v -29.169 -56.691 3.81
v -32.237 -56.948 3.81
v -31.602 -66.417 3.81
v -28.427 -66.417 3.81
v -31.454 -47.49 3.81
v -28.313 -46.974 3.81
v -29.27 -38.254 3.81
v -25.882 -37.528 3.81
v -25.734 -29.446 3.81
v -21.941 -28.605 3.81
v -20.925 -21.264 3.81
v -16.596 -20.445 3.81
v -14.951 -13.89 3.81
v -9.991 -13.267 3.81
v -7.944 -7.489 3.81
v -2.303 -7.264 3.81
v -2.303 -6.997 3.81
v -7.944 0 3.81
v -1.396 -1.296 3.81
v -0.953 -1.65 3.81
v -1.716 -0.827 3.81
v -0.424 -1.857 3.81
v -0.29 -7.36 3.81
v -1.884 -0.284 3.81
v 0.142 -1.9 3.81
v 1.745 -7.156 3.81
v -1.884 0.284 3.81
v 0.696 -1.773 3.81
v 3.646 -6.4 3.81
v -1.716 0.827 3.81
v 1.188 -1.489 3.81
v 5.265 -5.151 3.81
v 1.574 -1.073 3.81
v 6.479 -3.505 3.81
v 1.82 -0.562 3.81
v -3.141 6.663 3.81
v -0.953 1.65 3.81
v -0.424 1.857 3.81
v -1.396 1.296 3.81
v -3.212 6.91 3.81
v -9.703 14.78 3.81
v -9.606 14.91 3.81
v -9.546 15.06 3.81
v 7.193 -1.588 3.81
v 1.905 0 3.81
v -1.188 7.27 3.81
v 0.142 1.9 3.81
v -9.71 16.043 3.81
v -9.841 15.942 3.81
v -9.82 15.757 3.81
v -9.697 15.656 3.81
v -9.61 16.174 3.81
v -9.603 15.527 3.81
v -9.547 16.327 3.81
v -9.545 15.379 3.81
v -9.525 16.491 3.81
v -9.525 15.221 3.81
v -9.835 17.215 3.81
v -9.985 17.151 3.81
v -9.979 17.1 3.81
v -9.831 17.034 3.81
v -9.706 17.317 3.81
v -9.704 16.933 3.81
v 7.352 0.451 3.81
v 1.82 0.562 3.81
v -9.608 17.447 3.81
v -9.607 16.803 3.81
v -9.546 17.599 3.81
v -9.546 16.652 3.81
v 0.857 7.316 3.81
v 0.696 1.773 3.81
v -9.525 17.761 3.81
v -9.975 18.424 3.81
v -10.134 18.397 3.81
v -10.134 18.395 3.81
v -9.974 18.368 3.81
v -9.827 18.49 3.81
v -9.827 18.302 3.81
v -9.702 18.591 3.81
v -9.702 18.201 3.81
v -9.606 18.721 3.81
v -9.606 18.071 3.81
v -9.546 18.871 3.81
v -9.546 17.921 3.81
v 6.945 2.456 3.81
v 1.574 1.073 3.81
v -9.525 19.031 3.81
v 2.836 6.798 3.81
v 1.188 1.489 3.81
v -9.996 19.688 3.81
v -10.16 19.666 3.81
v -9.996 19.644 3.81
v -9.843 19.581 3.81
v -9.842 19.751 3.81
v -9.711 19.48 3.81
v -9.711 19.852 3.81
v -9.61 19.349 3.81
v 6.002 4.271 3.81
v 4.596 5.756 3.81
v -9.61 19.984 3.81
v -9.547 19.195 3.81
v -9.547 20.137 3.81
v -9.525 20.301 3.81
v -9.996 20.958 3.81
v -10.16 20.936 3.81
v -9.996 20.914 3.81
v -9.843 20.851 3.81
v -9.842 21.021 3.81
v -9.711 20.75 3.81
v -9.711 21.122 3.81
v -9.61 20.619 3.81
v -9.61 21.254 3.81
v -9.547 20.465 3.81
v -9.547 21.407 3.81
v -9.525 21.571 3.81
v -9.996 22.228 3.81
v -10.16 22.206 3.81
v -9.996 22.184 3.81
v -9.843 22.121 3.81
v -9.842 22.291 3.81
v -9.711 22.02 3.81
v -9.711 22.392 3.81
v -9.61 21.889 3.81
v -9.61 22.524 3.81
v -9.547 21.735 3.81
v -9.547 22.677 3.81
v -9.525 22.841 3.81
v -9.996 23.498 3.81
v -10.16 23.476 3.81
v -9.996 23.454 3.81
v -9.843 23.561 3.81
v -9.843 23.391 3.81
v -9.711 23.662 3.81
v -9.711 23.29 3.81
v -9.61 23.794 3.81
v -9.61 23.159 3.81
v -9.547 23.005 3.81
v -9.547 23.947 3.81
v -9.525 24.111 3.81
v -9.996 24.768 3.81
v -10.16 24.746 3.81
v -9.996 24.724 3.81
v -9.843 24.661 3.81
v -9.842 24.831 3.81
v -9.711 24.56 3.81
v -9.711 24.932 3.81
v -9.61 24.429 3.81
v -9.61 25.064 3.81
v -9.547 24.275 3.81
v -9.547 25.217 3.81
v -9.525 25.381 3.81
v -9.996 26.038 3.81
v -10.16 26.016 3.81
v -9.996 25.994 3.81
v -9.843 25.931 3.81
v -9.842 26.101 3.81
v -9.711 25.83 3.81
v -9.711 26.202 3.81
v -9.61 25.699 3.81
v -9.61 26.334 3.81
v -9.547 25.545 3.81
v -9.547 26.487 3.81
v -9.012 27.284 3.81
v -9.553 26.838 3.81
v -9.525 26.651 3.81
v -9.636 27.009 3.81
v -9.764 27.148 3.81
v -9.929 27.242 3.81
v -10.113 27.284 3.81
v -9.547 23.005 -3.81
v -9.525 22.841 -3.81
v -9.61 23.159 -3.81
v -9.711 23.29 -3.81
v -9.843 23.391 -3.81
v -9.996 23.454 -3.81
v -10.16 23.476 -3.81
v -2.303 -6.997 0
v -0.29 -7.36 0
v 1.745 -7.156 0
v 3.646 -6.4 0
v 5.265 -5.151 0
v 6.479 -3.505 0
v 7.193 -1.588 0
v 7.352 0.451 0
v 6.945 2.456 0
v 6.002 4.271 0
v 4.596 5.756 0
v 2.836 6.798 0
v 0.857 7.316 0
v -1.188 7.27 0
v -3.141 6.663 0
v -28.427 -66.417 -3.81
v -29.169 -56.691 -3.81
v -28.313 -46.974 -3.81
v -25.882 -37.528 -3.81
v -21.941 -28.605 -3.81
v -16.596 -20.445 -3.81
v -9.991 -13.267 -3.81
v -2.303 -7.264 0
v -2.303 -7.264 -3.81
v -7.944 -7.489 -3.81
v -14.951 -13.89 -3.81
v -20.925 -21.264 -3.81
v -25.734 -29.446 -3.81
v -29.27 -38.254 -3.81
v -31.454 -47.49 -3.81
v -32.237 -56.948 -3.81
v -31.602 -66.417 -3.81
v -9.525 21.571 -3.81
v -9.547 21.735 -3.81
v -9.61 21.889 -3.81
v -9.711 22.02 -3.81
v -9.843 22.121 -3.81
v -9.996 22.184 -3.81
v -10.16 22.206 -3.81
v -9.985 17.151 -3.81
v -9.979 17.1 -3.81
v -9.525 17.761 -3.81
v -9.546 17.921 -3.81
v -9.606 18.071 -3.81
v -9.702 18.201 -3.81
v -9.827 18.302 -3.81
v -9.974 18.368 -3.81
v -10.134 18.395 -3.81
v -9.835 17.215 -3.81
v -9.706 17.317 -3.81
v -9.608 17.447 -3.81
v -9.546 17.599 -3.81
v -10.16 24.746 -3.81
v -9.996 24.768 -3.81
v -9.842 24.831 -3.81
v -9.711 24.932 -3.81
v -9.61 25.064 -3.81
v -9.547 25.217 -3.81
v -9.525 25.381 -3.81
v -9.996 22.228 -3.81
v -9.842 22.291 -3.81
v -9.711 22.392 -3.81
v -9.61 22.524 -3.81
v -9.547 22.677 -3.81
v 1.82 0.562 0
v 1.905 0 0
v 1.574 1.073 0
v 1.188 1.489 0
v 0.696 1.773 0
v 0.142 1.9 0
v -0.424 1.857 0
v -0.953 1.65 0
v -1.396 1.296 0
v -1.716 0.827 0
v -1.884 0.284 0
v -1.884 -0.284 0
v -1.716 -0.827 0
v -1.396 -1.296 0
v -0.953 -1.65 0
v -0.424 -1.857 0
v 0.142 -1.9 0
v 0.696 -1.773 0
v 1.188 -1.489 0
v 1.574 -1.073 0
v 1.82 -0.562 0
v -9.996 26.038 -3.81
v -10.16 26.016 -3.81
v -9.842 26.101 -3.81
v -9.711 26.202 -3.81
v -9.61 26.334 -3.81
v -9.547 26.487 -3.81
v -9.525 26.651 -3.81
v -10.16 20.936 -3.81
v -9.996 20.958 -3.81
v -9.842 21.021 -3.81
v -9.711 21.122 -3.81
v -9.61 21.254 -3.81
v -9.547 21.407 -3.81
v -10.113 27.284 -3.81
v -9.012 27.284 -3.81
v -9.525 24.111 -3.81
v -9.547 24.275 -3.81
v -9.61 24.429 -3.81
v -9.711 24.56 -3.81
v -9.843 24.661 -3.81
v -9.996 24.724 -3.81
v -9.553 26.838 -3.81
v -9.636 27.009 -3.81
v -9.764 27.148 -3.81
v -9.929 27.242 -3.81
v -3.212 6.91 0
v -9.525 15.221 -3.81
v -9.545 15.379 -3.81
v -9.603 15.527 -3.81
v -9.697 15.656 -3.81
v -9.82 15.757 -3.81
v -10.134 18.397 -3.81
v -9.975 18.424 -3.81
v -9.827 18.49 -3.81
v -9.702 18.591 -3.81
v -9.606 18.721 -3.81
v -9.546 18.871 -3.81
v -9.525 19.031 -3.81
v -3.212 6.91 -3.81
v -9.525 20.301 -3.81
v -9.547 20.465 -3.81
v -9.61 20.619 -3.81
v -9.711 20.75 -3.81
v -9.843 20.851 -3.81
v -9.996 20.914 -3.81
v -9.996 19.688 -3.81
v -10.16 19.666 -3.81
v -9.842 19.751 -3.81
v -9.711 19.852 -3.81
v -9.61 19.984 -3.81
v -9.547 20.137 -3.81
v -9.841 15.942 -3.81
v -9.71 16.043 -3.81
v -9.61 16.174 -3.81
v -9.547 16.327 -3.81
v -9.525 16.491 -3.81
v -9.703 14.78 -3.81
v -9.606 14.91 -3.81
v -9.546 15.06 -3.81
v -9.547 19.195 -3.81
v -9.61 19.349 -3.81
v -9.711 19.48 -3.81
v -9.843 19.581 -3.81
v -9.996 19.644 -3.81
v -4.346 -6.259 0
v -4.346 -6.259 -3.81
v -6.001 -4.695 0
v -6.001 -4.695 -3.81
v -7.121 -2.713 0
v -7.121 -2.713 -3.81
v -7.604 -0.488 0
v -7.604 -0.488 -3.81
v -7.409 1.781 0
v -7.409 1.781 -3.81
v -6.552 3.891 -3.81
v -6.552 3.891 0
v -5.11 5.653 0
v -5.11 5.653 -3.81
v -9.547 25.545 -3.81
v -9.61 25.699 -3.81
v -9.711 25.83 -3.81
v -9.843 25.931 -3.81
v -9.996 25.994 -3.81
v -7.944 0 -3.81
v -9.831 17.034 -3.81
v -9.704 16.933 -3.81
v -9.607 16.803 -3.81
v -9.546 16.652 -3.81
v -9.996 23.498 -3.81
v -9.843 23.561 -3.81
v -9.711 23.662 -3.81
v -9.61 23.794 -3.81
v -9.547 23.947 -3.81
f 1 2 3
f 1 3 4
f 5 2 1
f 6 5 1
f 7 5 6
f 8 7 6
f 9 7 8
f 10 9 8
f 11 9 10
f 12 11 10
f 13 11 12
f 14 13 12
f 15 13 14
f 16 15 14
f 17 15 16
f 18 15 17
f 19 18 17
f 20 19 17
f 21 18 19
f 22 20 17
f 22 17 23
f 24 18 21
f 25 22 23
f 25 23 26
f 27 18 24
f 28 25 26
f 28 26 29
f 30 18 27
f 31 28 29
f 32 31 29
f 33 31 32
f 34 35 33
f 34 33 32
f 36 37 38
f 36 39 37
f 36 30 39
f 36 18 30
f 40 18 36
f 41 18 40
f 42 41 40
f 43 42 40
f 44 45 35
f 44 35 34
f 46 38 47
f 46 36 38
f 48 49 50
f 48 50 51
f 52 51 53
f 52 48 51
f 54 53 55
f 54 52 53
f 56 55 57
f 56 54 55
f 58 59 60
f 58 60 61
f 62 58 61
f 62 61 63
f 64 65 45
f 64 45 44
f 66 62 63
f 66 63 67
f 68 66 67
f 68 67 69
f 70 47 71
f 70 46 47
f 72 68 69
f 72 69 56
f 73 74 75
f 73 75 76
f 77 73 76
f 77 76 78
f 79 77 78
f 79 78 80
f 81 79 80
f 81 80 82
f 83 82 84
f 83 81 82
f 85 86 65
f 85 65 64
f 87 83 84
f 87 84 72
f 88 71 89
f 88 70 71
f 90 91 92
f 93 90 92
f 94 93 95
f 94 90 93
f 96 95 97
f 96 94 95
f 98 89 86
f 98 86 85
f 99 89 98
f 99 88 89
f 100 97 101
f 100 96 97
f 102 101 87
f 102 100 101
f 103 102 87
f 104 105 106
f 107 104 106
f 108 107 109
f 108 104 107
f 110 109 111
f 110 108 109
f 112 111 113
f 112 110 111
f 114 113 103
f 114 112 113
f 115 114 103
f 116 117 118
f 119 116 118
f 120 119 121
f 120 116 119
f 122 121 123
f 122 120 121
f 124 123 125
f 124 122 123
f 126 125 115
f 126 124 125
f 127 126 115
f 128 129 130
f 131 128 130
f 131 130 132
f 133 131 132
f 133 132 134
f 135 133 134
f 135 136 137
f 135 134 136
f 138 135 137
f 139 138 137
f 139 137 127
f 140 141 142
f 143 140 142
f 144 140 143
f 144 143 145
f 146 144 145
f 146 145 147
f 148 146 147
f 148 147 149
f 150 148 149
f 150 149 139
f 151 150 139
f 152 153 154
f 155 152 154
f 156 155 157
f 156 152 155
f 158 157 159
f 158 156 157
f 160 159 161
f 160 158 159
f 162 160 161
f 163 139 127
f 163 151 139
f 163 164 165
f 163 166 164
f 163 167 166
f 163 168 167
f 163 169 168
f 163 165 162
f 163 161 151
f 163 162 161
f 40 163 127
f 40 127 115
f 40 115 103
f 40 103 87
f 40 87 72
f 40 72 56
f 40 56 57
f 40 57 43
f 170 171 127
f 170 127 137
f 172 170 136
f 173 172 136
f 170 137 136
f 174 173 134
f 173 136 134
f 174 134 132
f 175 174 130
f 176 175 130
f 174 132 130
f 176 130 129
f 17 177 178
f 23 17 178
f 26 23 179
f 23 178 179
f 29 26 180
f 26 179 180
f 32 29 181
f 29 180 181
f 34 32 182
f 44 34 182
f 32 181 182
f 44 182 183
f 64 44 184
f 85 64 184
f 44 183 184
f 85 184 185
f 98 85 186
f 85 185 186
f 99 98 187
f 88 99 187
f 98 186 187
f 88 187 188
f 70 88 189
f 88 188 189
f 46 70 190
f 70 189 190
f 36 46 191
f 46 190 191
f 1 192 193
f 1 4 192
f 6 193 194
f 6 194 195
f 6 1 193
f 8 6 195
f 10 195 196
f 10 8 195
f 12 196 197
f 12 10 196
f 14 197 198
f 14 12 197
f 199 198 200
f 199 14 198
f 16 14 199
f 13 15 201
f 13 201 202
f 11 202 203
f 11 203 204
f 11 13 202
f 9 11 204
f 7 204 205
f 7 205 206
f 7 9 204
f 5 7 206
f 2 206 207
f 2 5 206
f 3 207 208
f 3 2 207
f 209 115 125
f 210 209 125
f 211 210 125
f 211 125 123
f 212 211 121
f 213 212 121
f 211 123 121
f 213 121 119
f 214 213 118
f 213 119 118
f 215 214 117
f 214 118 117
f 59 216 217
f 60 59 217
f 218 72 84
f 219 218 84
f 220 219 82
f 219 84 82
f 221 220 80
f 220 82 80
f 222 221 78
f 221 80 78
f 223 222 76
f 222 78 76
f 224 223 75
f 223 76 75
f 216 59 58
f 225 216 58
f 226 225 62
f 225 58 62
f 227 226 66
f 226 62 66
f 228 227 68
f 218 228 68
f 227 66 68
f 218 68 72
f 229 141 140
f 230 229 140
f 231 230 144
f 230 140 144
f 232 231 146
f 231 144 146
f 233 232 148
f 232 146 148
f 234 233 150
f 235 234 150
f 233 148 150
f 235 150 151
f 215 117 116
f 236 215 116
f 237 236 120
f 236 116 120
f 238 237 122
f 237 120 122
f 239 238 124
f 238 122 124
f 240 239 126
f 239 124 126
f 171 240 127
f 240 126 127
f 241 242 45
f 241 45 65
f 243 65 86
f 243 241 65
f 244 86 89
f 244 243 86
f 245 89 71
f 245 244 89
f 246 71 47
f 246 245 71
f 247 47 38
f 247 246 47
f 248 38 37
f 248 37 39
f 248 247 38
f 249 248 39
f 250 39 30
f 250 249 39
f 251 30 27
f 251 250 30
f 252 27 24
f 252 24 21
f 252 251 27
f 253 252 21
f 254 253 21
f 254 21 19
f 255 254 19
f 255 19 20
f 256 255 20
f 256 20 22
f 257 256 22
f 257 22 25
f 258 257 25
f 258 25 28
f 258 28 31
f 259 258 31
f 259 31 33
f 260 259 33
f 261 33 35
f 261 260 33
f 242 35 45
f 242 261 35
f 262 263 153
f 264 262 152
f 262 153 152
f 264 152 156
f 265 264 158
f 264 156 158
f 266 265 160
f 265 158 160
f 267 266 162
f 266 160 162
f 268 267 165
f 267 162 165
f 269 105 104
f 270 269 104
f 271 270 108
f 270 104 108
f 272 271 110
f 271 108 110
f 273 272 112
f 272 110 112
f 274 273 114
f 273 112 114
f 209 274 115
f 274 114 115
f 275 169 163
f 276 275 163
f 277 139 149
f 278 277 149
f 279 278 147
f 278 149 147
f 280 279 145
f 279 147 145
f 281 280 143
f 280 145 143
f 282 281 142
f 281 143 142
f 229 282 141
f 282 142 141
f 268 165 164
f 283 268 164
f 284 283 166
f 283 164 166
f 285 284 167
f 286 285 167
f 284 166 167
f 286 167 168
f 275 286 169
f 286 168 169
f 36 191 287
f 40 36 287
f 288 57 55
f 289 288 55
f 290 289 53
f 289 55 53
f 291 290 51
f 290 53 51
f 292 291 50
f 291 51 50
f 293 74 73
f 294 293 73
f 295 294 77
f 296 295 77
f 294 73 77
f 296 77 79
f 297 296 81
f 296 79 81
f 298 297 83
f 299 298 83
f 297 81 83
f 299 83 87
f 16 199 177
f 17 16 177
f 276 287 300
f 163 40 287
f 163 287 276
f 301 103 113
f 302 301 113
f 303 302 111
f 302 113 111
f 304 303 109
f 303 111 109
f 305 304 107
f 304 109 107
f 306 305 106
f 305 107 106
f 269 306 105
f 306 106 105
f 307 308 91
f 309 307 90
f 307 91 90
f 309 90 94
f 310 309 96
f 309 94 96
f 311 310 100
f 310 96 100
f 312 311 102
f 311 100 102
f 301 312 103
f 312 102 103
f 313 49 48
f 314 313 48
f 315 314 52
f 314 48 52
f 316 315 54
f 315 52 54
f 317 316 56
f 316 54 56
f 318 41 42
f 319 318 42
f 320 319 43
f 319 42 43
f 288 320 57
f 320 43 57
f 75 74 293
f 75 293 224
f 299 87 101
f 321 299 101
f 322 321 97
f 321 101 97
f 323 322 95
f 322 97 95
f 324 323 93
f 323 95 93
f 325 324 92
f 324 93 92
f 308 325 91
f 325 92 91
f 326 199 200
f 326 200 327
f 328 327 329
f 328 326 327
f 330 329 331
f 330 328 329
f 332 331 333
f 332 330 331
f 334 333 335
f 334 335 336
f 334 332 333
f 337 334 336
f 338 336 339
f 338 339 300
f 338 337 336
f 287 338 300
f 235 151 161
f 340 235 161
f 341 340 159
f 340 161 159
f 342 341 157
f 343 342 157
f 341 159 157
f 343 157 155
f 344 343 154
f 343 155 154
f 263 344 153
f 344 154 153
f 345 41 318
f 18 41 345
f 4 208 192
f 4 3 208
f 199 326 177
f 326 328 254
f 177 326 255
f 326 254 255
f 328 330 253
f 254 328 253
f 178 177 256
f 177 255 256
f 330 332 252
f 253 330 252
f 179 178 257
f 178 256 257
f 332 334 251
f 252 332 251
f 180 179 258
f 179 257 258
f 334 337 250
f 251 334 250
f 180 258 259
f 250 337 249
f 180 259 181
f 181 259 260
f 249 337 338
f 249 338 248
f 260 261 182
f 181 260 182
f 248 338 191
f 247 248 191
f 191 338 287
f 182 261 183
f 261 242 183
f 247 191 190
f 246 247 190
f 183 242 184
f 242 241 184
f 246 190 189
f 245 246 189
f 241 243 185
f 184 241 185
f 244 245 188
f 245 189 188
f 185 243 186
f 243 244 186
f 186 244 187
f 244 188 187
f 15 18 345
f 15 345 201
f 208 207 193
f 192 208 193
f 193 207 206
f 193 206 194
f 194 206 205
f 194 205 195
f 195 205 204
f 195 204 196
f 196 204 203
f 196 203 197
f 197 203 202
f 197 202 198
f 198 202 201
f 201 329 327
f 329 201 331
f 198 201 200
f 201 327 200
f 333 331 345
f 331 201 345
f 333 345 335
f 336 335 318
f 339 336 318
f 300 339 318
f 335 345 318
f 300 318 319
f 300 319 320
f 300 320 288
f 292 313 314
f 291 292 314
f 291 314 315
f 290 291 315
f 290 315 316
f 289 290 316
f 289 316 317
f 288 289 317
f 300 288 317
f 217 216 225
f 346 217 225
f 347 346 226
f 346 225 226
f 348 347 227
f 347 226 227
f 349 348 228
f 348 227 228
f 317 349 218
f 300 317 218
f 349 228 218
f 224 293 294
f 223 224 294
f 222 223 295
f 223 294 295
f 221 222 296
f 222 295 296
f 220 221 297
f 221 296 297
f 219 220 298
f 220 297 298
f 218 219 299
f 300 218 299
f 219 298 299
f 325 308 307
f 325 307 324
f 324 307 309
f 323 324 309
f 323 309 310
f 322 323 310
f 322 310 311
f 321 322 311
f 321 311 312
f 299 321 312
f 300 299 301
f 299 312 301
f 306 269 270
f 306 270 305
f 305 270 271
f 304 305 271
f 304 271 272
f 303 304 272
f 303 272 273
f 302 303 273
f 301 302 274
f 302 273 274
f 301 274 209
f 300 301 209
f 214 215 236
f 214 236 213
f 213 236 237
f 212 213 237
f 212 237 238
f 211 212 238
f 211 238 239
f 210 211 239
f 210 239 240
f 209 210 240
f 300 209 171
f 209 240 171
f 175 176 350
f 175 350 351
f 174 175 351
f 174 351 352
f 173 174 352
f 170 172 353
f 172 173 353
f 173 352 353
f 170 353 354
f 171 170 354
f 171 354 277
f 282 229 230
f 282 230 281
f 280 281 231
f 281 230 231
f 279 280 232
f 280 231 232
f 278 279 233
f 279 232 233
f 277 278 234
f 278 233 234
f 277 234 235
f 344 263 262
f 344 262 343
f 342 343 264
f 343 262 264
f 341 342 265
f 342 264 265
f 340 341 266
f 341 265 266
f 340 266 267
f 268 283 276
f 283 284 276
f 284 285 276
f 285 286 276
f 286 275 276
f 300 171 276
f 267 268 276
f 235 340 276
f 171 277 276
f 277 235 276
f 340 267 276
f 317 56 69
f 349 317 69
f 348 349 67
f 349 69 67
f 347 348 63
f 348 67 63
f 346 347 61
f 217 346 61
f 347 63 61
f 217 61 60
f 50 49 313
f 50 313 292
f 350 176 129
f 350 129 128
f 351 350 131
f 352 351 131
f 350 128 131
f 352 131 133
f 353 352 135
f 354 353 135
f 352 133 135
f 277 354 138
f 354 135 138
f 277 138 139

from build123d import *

# Parameters (mm, degrees)
F0_R     = 1.905
F1_DEPTH = 3.81
F2_DEPTH = 3.81
F4_DEPTH = 7.621


# Not quite as in the source:
# - a feature names something its author has since deleted; it is built from what else it names


with BuildPart() as f1:
    # F0 (on Top) → F1 (new body)
    with BuildSketch(Plane.XY):
        with BuildLine():
            ThreePointArc((-28.4269883335, -66.4172298291), (-24.0943230698, -32.9852682882), (-2.3028327904, -7.2637016141))
            Line((-2.3028327904, -7.2637016141), (-7.943934761, -7.4889131964))
            ThreePointArc((-7.943934761, -7.4889131964), (-27.6668151141, -33.7839124183), (-31.6019883335, -66.4172298291))
            Line((-31.6019883335, -66.4172298291), (-28.4269883335, -66.4172298291))
        make_face()
        with BuildLine():
            ThreePointArc((-2.3028327904, -7.2637016141), (-7.6043838567, -0.4875922071), (-3.211656147, 6.9101132258))
            Line((-3.211656147, 6.9101132258), (-10.16, 31.3176262796))
            Line((-10.16, 31.3176262796), (-10.16, 18.6176262796))
            Line((-10.16, 18.6176262796), (-7.943934761, 0))
            Line((-7.943934761, 0), (-7.943934761, -7.4889131964))
            Line((-7.943934761, -7.4889131964), (-2.3028327904, -7.2637016141))
        make_face()
        with BuildLine():
            ThreePointArc((7.366, 0), (3.9446061685, 6.2207747247), (-3.1412055867, 6.6626408775))
            ThreePointArc((-3.1412055867, 6.6626408775), (-7.3521647617, -0.4512530518), (-2.3028327904, -6.9967790546))
            ThreePointArc((-2.3028327904, -6.9967790546), (4.3182918883, -5.9674375713), (7.366, 0))
        make_face()
        Circle(F0_R, mode=Mode.SUBTRACT)
        with BuildLine():
            Line((-3.1412055867, 6.6626408775), (-3.211656147, 6.9101132258))
            ThreePointArc((-3.211656147, 6.9101132258), (-7.6043838567, -0.4875922071), (-2.3028327904, -7.2637016141))
            Line((-2.3028327904, -7.2637016141), (-2.3028327904, -6.9967790546))
            ThreePointArc((-2.3028327904, -6.9967790546), (-7.3521647617, -0.4512530518), (-3.1412055867, 6.6626408775))
        make_face()
    extrude(amount=F1_DEPTH)

    # F0 (on Top) → F2 (join)
    with BuildSketch(Plane.XY):
        with BuildLine():
            ThreePointArc((-2.3028327904, -7.2637016141), (-7.6043838567, -0.4875922071), (-3.211656147, 6.9101132258))
            Line((-3.211656147, 6.9101132258), (-10.16, 31.3176262796))
            Line((-10.16, 31.3176262796), (-10.16, 18.6176262796))
            Line((-10.16, 18.6176262796), (-7.943934761, 0))
            Line((-7.943934761, 0), (-7.943934761, -7.4889131964))
            Line((-7.943934761, -7.4889131964), (-2.3028327904, -7.2637016141))
        make_face()
        with BuildLine():
            ThreePointArc((-28.4269883335, -66.4172298291), (-24.0943230698, -32.9852682882), (-2.3028327904, -7.2637016141))
            Line((-2.3028327904, -7.2637016141), (-7.943934761, -7.4889131964))
            ThreePointArc((-7.943934761, -7.4889131964), (-27.6668151141, -33.7839124183), (-31.6019883335, -66.4172298291))
            Line((-31.6019883335, -66.4172298291), (-28.4269883335, -66.4172298291))
        make_face()
    extrude(amount=-F2_DEPTH)

    # F3 (on face) → F4 (cut, through all)
    with BuildSketch(Plane.XY.offset(3.81)):
        with BuildLine():
            Line((-10.16, 27.284329945), (-10.1133690513, 27.284329945))
            ThreePointArc((-10.1133690513, 27.284329945), (-10.1366687719, 27.2856156574), (-10.16, 27.2860444212))
            Line((-10.16, 27.2860444212), (-10.16, 27.284329945))
        make_face()
        with BuildLine():
            Line((-10.16, 28.5560444212), (-10.16, 27.2860444212))
            ThreePointArc((-10.16, 27.2860444212), (-9.7109871939, 27.4720316151), (-9.525, 27.9210444212))
            ThreePointArc((-9.525, 27.9210444212), (-9.7109871939, 28.3700572272), (-10.16, 28.5560444212))
        make_face()
        with BuildLine():
            Line((-10.1133690513, 27.284329945), (-9.0117990451, 27.284329945))
            Line((-9.0117990451, 27.284329945), (-10.16, 31.3176262796))
            Line((-10.16, 31.3176262796), (-10.16, 28.5560444212))
            ThreePointArc((-10.16, 28.5560444212), (-9.7109871939, 28.3700572272), (-9.525, 27.9210444212))
            ThreePointArc((-9.525, 27.9210444212), (-9.7109871939, 27.4720316151), (-10.16, 27.2860444212))
            ThreePointArc((-10.16, 27.2860444212), (-10.1366687719, 27.2856156574), (-10.1133690513, 27.284329945))
        make_face()
        with BuildLine():
            ThreePointArc((-9.525, 19.0310444212), (-9.7109871939, 19.4800572272), (-10.16, 19.6660444212))
            Line((-10.16, 19.6660444212), (-10.16, 18.6176262796))
            Line((-10.16, 18.6176262796), (-10.1336899082, 18.3965897112))
            ThreePointArc((-10.1336899082, 18.3965897112), (-9.7017795791, 18.5914320398), (-9.525, 19.0310444212))
        make_face()
        with BuildLine():
            Line((-10.16, 27.284329945), (-10.16, 26.0160444212))
            ThreePointArc((-10.16, 26.0160444212), (-9.7109871939, 26.2020316151), (-9.525, 26.6510444212))
            ThreePointArc((-9.525, 26.6510444212), (-9.6947927062, 27.0832563759), (-10.1133690513, 27.284329945))
            Line((-10.1133690513, 27.284329945), (-10.16, 27.284329945))
        make_face()
        with BuildLine():
            Line((-10.16, 26.0160444212), (-10.16, 24.7460444212))
            ThreePointArc((-10.16, 24.7460444212), (-9.7109871939, 24.9320316151), (-9.525, 25.3810444212))
            ThreePointArc((-9.525, 25.3810444212), (-9.7109871939, 25.8300572272), (-10.16, 26.0160444212))
        make_face()
        with BuildLine():
            Line((-10.16, 24.7460444212), (-10.16, 23.4760444212))
            ThreePointArc((-10.1600000026, 23.4760444212), (-9.7109871948, 23.6620316142), (-9.525, 24.1110444212))
            ThreePointArc((-9.525, 24.1110444212), (-9.7109871939, 24.5600572272), (-10.16, 24.7460444212))
        make_face()
        with BuildLine():
            Line((-10.16, 23.4760444212), (-10.16, 22.2060444212))
            ThreePointArc((-10.16, 22.2060444212), (-9.7109871939, 22.3920316151), (-9.525, 22.8410444212))
            ThreePointArc((-9.525, 22.8410444212), (-9.7109871948, 23.2900572282), (-10.1600000026, 23.4760444212))
        make_face()
        with BuildLine():
            Line((-10.16, 22.2060444212), (-10.16, 20.9360444212))
            ThreePointArc((-10.16, 20.9360444212), (-9.7109871939, 21.1220316151), (-9.525, 21.5710444212))
            ThreePointArc((-9.525, 21.5710444212), (-9.7109871939, 22.0200572272), (-10.16, 22.2060444212))
        make_face()
        with BuildLine():
            Line((-10.16, 20.9360444212), (-10.16, 19.6660444212))
            ThreePointArc((-10.16, 19.6660444212), (-9.7109871939, 19.8520316151), (-9.525, 20.3010444212))
            ThreePointArc((-9.525, 20.3010444212), (-9.7109871939, 20.7500572272), (-10.16, 20.9360444212))
        make_face()
        with BuildLine():
            Line((-10.1335594504, 18.3954937079), (-9.9853706378, 17.1505285853))
            ThreePointArc((-9.9853706378, 17.1505285853), (-9.6529917925, 17.3787256046), (-9.525, 17.7610444212))
            ThreePointArc((-9.525, 17.7610444212), (-9.7017343843, 18.20060969), (-10.1335594504, 18.3954937079))
        make_face()
        with BuildLine():
            Line((-9.9793324764, 17.099800732), (-9.8414839109, 15.941706182))
            ThreePointArc((-9.8414839109, 15.941706182), (-9.6097806271, 16.1740528729), (-9.525, 16.4910444212))
            ThreePointArc((-9.525, 16.4910444212), (-9.6511046878, 16.8708477404), (-9.9793324764, 17.099800732))
        make_face()
        with BuildLine():
            ThreePointArc((-9.7032002185, 14.7799560404), (-9.5712331271, 14.9831819202), (-9.525, 15.2210444212))
            ThreePointArc((-9.525, 15.2210444212), (-9.6034746489, 15.5268295313), (-9.8195024679, 15.7570354945))
            Line((-9.8195024679, 15.7570354945), (-9.7032002185, 14.7799560404))
        make_face()
    extrude(amount=-F4_DEPTH, mode=Mode.SUBTRACT)


solid = f1.part
